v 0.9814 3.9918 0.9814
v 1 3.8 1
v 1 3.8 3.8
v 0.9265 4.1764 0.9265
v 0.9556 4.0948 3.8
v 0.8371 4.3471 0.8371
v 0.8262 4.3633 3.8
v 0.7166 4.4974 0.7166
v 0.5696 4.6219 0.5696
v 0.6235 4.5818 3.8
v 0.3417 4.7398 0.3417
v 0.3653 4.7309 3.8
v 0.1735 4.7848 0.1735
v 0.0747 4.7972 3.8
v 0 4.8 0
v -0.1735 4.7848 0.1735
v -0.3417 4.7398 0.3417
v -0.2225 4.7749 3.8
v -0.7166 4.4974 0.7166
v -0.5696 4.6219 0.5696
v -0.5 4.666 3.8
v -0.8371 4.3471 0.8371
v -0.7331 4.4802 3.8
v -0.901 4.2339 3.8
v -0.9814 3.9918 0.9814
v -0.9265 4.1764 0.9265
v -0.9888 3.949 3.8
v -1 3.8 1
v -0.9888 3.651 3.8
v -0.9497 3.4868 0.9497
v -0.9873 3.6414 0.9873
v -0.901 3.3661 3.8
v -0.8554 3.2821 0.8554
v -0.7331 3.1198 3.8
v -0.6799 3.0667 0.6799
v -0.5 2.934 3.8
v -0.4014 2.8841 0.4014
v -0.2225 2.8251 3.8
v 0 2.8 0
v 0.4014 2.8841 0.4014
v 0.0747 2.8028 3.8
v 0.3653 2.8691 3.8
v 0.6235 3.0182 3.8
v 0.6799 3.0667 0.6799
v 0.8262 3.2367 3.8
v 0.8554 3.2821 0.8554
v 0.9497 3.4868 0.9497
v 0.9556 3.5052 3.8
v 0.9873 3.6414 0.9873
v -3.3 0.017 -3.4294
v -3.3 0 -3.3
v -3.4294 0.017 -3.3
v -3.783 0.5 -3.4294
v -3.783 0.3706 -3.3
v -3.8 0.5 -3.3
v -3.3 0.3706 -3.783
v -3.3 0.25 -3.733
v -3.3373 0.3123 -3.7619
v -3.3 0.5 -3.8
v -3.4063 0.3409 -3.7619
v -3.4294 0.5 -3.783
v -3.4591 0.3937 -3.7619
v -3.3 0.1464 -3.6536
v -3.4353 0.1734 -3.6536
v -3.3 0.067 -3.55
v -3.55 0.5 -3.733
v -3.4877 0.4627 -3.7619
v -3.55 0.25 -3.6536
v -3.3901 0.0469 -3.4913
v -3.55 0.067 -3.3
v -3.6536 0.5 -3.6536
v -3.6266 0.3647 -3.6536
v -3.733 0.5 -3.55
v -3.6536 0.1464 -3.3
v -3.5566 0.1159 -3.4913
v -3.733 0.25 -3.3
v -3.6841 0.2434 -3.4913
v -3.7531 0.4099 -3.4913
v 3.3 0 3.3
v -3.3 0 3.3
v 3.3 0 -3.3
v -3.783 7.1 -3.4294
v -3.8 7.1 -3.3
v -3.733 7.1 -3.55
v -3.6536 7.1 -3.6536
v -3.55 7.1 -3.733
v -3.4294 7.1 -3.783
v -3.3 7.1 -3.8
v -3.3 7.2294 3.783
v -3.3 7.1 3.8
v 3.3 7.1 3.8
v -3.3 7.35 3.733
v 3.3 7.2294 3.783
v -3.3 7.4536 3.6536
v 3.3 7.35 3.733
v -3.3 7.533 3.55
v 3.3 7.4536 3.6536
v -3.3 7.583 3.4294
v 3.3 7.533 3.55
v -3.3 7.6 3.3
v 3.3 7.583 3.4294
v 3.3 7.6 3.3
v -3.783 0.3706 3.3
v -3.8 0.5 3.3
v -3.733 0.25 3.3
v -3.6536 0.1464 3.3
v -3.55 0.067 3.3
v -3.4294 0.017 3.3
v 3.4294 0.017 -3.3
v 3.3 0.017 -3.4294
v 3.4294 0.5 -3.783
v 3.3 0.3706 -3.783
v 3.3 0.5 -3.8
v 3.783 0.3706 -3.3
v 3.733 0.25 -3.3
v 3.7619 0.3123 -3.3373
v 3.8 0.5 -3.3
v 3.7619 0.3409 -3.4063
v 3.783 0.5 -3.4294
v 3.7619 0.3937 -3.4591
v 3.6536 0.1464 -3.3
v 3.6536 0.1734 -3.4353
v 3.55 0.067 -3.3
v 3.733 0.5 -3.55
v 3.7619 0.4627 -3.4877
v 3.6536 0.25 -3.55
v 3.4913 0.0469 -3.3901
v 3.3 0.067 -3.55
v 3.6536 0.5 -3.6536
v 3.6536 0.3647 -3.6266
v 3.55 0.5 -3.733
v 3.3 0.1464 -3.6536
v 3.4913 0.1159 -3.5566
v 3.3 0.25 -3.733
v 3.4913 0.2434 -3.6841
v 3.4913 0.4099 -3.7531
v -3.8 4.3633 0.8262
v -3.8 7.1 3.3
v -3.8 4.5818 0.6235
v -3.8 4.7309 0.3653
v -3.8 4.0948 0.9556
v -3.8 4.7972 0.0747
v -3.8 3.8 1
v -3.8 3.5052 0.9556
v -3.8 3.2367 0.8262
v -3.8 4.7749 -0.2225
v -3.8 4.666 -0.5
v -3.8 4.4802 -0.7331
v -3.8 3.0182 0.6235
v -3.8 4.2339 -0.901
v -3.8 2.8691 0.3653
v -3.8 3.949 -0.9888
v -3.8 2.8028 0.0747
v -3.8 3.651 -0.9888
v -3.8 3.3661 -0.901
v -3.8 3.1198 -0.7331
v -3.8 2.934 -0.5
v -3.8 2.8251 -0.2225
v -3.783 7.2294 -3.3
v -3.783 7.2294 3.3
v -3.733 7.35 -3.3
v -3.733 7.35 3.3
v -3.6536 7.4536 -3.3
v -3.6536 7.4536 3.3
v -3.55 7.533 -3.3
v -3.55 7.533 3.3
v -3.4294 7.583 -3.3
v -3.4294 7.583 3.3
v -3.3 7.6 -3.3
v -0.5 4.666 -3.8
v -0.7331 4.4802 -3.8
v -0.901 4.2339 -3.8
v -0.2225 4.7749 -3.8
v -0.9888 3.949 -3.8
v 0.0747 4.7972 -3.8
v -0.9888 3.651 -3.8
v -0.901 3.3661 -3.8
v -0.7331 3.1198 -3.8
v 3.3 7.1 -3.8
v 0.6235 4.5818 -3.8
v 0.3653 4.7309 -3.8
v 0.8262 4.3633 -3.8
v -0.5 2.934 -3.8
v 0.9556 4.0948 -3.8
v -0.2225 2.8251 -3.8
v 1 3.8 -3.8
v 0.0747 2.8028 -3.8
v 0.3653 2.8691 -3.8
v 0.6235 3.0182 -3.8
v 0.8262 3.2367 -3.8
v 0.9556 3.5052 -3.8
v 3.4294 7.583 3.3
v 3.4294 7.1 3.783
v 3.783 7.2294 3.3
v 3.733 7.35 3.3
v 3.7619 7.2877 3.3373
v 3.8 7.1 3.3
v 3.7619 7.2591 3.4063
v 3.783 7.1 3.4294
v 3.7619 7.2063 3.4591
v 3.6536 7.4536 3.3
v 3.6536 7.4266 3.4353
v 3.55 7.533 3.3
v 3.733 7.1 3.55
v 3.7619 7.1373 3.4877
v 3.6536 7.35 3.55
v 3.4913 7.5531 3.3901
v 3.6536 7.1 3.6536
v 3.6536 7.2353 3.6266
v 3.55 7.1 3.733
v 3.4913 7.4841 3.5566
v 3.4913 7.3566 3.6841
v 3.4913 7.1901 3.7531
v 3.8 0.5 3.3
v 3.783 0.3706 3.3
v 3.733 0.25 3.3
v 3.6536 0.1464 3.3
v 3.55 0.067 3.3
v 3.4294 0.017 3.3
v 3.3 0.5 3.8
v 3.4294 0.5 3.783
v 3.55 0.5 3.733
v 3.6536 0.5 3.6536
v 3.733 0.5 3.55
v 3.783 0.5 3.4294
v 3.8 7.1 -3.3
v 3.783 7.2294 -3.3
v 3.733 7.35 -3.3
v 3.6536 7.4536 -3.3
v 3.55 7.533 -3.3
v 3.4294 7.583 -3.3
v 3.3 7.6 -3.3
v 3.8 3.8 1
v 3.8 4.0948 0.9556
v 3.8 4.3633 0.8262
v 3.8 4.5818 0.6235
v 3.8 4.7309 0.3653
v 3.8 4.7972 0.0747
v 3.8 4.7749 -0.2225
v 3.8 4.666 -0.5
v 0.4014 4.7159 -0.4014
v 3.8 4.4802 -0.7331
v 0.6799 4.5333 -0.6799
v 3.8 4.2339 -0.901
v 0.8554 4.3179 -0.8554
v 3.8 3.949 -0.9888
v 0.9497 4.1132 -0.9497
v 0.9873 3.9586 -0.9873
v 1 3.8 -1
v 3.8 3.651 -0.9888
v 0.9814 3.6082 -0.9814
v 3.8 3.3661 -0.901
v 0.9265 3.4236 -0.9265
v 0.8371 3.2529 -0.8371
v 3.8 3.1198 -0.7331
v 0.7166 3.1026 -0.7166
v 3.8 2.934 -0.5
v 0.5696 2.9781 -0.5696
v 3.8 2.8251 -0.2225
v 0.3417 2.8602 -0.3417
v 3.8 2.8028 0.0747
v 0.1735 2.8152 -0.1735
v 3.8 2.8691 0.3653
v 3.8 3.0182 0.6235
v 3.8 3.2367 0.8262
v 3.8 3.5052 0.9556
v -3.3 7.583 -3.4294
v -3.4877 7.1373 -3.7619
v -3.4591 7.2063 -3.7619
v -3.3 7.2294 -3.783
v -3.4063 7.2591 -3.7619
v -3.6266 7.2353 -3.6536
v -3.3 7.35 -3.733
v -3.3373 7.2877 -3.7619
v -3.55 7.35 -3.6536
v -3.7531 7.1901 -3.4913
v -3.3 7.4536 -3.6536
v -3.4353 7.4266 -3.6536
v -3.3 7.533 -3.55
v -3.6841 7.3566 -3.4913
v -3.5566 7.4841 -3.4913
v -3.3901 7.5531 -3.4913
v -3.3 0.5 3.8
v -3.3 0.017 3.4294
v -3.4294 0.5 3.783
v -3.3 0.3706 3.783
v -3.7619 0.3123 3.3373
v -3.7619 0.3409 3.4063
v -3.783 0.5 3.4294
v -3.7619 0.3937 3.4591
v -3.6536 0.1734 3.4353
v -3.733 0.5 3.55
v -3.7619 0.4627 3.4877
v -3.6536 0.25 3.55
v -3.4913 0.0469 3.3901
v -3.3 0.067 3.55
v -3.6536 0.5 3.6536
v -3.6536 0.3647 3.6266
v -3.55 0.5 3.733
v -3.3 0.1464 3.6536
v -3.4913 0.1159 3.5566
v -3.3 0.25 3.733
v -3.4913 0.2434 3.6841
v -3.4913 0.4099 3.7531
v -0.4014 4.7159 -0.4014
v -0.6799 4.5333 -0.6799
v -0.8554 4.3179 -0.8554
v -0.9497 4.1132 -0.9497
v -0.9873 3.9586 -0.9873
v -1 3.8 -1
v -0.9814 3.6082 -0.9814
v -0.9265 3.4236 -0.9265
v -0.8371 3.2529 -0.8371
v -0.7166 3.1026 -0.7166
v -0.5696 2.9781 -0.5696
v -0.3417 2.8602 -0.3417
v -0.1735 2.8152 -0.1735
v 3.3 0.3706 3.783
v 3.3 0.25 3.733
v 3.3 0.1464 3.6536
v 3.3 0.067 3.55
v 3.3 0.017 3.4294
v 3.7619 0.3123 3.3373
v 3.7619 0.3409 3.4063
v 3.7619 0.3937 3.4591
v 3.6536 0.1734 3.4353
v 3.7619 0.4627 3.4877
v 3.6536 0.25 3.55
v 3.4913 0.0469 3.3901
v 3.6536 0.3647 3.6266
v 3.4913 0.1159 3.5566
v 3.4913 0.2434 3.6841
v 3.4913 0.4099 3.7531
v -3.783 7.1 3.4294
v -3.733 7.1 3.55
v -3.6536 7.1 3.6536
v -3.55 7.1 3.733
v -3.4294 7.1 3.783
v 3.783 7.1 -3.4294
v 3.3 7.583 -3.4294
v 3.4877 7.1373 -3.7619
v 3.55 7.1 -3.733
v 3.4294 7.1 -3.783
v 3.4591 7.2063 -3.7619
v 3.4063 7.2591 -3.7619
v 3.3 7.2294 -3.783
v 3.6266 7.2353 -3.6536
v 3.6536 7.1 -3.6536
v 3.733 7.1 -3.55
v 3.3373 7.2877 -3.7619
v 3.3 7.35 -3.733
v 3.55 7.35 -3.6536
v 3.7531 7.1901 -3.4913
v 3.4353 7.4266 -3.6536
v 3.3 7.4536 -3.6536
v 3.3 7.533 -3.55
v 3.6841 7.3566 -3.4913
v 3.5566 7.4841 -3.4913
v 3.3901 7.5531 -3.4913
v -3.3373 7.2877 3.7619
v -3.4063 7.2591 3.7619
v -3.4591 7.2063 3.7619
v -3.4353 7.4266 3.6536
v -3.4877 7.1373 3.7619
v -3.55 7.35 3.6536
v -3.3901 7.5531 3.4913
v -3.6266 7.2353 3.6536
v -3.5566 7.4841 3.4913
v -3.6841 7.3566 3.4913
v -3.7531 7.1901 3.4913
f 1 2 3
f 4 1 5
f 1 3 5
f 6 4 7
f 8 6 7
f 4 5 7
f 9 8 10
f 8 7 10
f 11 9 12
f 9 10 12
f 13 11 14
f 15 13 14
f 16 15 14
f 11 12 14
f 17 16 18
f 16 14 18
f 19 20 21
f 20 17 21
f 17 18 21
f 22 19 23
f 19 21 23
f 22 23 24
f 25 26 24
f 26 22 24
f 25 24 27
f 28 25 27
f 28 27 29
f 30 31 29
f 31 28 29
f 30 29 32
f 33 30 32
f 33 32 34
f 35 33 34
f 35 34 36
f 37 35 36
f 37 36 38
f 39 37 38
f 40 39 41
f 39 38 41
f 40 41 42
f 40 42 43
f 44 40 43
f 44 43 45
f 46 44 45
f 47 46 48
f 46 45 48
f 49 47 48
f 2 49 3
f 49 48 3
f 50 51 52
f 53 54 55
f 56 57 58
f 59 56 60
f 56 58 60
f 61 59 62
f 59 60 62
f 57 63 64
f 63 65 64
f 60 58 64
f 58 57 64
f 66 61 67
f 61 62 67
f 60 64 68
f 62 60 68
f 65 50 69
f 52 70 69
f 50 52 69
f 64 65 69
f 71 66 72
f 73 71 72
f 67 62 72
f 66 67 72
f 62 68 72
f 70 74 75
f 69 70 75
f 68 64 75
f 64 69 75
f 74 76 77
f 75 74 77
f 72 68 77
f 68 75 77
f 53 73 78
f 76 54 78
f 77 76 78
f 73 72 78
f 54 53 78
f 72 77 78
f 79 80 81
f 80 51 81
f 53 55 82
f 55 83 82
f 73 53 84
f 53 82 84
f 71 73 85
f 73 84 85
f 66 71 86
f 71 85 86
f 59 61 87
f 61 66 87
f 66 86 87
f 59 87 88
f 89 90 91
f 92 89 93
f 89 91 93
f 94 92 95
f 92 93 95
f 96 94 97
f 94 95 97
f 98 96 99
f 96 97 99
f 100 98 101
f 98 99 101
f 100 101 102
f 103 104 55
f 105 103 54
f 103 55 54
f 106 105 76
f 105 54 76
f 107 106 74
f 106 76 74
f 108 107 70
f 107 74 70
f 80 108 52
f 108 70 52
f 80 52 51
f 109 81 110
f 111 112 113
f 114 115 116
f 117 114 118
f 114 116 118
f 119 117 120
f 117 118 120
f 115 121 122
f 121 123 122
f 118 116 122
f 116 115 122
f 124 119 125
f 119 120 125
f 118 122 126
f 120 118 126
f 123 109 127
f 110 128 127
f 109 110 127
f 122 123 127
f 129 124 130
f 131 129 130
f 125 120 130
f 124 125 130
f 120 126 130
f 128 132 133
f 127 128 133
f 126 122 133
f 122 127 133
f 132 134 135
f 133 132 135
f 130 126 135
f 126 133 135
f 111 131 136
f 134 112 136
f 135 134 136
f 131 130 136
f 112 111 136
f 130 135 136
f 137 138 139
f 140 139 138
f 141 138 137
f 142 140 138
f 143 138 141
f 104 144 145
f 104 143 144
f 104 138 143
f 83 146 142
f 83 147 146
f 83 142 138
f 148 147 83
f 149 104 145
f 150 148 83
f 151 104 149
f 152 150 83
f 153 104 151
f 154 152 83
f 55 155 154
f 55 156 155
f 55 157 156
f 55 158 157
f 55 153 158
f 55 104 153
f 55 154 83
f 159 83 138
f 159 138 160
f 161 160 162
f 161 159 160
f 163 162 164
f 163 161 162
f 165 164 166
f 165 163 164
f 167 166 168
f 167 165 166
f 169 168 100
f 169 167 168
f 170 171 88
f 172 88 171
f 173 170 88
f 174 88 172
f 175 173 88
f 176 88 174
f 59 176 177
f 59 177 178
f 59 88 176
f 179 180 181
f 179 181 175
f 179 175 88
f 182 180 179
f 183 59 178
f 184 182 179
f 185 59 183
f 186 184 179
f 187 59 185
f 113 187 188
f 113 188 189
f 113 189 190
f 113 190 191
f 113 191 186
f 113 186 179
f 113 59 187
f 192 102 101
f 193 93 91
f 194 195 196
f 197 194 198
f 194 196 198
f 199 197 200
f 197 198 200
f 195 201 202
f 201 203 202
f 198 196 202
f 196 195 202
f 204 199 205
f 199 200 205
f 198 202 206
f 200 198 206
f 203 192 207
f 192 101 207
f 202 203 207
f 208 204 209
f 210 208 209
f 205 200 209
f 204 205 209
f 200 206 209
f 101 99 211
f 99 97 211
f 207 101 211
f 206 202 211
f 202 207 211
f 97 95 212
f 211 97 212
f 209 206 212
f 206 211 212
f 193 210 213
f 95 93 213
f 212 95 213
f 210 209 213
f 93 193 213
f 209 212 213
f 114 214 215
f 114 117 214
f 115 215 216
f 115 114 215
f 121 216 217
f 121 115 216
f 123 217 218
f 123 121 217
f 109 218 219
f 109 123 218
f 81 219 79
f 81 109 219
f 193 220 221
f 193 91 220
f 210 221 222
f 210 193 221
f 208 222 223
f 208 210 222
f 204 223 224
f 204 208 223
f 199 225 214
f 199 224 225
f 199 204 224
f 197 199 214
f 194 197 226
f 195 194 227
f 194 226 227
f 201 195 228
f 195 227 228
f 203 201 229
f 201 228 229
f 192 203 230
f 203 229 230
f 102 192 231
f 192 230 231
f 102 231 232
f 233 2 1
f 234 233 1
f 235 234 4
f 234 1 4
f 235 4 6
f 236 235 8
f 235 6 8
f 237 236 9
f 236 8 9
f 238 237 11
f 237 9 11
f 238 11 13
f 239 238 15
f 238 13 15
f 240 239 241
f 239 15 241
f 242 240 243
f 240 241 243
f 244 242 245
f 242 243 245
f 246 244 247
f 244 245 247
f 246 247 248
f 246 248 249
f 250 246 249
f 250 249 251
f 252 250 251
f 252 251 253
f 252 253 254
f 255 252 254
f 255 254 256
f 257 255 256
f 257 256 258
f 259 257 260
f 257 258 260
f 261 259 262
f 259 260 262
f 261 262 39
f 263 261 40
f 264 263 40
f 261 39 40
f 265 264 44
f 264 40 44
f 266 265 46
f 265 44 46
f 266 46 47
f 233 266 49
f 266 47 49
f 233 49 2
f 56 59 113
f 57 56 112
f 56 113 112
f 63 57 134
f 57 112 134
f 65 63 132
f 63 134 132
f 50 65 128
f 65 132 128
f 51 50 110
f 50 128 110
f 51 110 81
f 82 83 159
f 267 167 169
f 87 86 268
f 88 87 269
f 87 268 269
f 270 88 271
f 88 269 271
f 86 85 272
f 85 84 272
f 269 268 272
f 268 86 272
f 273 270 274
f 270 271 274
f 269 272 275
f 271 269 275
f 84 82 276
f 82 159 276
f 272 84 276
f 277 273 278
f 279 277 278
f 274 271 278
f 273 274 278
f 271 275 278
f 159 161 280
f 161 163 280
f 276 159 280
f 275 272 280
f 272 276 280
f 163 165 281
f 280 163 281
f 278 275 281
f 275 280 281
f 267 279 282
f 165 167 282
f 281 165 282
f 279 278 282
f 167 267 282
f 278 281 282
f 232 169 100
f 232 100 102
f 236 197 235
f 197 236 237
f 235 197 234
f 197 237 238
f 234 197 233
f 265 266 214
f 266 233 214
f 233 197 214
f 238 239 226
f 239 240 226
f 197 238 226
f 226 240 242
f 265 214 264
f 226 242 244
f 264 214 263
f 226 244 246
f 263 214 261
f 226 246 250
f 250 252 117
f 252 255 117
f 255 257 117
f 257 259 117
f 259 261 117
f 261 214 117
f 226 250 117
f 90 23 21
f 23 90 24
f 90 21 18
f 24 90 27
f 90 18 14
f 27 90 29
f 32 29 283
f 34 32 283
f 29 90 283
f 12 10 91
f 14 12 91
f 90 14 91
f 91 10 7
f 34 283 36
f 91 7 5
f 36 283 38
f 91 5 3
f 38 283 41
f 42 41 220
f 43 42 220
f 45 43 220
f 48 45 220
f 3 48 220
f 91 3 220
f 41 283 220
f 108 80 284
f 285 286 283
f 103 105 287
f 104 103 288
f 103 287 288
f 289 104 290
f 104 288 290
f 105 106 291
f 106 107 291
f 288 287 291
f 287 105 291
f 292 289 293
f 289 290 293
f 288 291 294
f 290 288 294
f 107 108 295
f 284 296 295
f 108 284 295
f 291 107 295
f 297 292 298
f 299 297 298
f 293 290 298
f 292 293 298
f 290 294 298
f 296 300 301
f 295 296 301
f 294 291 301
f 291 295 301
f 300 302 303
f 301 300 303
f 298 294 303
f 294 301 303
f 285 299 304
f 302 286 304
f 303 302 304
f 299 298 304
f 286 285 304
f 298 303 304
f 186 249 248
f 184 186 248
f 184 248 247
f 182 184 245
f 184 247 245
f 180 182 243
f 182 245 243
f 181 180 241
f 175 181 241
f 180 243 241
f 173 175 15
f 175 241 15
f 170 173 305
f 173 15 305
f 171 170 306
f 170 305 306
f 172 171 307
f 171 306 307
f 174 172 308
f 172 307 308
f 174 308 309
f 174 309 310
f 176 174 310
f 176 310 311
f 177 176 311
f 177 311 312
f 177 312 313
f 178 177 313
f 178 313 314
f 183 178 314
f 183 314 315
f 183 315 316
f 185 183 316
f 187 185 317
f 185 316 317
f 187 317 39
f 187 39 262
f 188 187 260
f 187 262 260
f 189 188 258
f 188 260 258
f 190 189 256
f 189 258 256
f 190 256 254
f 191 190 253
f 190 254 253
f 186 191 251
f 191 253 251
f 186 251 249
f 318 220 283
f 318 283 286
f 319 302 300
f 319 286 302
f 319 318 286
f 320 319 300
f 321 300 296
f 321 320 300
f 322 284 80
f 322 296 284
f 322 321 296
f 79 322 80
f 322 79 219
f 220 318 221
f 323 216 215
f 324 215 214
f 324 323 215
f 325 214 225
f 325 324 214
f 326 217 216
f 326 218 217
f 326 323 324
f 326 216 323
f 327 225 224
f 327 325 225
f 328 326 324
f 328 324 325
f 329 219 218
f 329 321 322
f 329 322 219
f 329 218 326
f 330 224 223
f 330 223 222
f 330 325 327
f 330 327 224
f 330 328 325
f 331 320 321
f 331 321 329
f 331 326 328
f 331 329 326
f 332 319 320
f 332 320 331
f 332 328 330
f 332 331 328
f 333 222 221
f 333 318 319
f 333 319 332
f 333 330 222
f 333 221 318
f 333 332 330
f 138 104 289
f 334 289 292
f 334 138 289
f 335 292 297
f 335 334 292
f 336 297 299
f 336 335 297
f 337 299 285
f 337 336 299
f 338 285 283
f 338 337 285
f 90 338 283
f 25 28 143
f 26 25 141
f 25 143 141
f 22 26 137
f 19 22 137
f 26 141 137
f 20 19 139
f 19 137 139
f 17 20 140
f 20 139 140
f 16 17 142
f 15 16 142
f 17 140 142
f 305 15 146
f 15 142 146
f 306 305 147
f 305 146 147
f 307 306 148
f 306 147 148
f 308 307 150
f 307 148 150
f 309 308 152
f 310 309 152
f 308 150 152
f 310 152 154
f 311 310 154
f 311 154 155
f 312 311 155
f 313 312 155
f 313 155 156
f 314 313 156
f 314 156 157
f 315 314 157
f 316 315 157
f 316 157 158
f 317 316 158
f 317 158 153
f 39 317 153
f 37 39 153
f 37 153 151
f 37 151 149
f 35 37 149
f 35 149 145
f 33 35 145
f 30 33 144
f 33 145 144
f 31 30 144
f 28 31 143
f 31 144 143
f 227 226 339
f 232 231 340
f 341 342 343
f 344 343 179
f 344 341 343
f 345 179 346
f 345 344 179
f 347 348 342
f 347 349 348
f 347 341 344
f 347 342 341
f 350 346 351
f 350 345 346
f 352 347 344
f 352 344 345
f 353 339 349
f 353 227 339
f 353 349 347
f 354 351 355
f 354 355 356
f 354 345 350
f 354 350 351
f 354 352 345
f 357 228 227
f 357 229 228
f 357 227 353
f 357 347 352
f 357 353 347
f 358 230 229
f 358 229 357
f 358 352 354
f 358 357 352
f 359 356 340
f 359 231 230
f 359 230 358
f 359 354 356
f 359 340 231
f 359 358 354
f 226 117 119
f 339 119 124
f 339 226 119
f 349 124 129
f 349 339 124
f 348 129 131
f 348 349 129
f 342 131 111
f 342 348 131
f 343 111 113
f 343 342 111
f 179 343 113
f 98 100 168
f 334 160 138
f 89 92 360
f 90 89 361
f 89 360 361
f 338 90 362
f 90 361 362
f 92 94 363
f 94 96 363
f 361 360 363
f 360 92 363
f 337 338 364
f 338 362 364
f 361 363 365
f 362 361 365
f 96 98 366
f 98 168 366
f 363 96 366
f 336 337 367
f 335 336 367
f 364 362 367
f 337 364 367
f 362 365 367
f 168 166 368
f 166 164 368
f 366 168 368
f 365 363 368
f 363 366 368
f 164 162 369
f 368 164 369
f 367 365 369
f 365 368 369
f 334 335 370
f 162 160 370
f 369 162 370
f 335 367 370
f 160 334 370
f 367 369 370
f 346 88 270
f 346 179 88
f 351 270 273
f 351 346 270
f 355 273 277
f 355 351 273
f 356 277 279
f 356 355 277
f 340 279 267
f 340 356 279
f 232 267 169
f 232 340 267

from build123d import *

# Parameters (mm, degrees)
SKETCH2_W           = 7.6
SKETCH2_H           = 7.6
BOSS_EXTRUDE1_DEPTH = 7.6
FILLET1_R           = 0.5
SKETCH3_R           = 1
CUT_EXTRUDE1_DEPTH  = 10
CUT_EXTRUDE2_REACH  = 13.4
SKETCH4_R           = 1


with BuildPart() as part:
    # Sketch2 → Boss-Extrude1 (new body)
    with BuildSketch(Plane(origin=(0, 0, 0), x_dir=(1, 0, 0), z_dir=(0, 1, 0))):
        Rectangle(SKETCH2_W, SKETCH2_H)
    extrude(amount=BOSS_EXTRUDE1_DEPTH)

    # Fillet1
    fillet1_edges = [part.edges().sort_by_distance(p)[0] for p in [
        (-3.8, 7.6, 0),
        (0, 7.6, 3.8),
        (3.8, 7.6, 0),
        (0, 0, 3.8),
        (-3.8, 0, 0),
        (0, 0, -3.8),
        (3.8, 0, 0),
        (3.8, 3.8, 3.8),
        (-3.8, 3.8, 3.8),
        (-3.8, 3.8, -3.8),
        (3.8, 3.8, -3.8),
        (0, 7.6, -3.8),
    ]]
    fillet(fillet1_edges, radius=FILLET1_R)

    # Sketch3 → Cut-Extrude1 (cut)
    with BuildSketch(Plane.ZY.offset(3.8)):
        with Locations((0, 3.8)):
            Circle(SKETCH3_R)
    extrude(amount=-CUT_EXTRUDE1_DEPTH, mode=Mode.SUBTRACT)

    # Cut-Extrude2: up to this face of the body (flat: up to its plane)
    cut_extrude2_end = Plane(part.part.faces().sort_by_distance((0, 3.8, -3.8))[0])
    # Sketch4 → Cut-Extrude2 (cut, up to the picked face)
    with BuildSketch(Plane.XY.offset(3.8), mode=Mode.PRIVATE) as cut_extrude2_sk1:
        with Locations((0, 3.8)):
            Circle(SKETCH4_R)
    cut_extrude2_tool1 = split(extrude(cut_extrude2_sk1.sketch, amount=-CUT_EXTRUDE2_REACH, mode=Mode.PRIVATE), bisect_by=cut_extrude2_end, keep=Keep.BOTH, mode=Mode.PRIVATE)
    add(cut_extrude2_tool1.solids().sort_by(Axis((0, 3.8, 3.8), (0, 0, -1)))[0], mode=Mode.SUBTRACT)


solid = part.part
